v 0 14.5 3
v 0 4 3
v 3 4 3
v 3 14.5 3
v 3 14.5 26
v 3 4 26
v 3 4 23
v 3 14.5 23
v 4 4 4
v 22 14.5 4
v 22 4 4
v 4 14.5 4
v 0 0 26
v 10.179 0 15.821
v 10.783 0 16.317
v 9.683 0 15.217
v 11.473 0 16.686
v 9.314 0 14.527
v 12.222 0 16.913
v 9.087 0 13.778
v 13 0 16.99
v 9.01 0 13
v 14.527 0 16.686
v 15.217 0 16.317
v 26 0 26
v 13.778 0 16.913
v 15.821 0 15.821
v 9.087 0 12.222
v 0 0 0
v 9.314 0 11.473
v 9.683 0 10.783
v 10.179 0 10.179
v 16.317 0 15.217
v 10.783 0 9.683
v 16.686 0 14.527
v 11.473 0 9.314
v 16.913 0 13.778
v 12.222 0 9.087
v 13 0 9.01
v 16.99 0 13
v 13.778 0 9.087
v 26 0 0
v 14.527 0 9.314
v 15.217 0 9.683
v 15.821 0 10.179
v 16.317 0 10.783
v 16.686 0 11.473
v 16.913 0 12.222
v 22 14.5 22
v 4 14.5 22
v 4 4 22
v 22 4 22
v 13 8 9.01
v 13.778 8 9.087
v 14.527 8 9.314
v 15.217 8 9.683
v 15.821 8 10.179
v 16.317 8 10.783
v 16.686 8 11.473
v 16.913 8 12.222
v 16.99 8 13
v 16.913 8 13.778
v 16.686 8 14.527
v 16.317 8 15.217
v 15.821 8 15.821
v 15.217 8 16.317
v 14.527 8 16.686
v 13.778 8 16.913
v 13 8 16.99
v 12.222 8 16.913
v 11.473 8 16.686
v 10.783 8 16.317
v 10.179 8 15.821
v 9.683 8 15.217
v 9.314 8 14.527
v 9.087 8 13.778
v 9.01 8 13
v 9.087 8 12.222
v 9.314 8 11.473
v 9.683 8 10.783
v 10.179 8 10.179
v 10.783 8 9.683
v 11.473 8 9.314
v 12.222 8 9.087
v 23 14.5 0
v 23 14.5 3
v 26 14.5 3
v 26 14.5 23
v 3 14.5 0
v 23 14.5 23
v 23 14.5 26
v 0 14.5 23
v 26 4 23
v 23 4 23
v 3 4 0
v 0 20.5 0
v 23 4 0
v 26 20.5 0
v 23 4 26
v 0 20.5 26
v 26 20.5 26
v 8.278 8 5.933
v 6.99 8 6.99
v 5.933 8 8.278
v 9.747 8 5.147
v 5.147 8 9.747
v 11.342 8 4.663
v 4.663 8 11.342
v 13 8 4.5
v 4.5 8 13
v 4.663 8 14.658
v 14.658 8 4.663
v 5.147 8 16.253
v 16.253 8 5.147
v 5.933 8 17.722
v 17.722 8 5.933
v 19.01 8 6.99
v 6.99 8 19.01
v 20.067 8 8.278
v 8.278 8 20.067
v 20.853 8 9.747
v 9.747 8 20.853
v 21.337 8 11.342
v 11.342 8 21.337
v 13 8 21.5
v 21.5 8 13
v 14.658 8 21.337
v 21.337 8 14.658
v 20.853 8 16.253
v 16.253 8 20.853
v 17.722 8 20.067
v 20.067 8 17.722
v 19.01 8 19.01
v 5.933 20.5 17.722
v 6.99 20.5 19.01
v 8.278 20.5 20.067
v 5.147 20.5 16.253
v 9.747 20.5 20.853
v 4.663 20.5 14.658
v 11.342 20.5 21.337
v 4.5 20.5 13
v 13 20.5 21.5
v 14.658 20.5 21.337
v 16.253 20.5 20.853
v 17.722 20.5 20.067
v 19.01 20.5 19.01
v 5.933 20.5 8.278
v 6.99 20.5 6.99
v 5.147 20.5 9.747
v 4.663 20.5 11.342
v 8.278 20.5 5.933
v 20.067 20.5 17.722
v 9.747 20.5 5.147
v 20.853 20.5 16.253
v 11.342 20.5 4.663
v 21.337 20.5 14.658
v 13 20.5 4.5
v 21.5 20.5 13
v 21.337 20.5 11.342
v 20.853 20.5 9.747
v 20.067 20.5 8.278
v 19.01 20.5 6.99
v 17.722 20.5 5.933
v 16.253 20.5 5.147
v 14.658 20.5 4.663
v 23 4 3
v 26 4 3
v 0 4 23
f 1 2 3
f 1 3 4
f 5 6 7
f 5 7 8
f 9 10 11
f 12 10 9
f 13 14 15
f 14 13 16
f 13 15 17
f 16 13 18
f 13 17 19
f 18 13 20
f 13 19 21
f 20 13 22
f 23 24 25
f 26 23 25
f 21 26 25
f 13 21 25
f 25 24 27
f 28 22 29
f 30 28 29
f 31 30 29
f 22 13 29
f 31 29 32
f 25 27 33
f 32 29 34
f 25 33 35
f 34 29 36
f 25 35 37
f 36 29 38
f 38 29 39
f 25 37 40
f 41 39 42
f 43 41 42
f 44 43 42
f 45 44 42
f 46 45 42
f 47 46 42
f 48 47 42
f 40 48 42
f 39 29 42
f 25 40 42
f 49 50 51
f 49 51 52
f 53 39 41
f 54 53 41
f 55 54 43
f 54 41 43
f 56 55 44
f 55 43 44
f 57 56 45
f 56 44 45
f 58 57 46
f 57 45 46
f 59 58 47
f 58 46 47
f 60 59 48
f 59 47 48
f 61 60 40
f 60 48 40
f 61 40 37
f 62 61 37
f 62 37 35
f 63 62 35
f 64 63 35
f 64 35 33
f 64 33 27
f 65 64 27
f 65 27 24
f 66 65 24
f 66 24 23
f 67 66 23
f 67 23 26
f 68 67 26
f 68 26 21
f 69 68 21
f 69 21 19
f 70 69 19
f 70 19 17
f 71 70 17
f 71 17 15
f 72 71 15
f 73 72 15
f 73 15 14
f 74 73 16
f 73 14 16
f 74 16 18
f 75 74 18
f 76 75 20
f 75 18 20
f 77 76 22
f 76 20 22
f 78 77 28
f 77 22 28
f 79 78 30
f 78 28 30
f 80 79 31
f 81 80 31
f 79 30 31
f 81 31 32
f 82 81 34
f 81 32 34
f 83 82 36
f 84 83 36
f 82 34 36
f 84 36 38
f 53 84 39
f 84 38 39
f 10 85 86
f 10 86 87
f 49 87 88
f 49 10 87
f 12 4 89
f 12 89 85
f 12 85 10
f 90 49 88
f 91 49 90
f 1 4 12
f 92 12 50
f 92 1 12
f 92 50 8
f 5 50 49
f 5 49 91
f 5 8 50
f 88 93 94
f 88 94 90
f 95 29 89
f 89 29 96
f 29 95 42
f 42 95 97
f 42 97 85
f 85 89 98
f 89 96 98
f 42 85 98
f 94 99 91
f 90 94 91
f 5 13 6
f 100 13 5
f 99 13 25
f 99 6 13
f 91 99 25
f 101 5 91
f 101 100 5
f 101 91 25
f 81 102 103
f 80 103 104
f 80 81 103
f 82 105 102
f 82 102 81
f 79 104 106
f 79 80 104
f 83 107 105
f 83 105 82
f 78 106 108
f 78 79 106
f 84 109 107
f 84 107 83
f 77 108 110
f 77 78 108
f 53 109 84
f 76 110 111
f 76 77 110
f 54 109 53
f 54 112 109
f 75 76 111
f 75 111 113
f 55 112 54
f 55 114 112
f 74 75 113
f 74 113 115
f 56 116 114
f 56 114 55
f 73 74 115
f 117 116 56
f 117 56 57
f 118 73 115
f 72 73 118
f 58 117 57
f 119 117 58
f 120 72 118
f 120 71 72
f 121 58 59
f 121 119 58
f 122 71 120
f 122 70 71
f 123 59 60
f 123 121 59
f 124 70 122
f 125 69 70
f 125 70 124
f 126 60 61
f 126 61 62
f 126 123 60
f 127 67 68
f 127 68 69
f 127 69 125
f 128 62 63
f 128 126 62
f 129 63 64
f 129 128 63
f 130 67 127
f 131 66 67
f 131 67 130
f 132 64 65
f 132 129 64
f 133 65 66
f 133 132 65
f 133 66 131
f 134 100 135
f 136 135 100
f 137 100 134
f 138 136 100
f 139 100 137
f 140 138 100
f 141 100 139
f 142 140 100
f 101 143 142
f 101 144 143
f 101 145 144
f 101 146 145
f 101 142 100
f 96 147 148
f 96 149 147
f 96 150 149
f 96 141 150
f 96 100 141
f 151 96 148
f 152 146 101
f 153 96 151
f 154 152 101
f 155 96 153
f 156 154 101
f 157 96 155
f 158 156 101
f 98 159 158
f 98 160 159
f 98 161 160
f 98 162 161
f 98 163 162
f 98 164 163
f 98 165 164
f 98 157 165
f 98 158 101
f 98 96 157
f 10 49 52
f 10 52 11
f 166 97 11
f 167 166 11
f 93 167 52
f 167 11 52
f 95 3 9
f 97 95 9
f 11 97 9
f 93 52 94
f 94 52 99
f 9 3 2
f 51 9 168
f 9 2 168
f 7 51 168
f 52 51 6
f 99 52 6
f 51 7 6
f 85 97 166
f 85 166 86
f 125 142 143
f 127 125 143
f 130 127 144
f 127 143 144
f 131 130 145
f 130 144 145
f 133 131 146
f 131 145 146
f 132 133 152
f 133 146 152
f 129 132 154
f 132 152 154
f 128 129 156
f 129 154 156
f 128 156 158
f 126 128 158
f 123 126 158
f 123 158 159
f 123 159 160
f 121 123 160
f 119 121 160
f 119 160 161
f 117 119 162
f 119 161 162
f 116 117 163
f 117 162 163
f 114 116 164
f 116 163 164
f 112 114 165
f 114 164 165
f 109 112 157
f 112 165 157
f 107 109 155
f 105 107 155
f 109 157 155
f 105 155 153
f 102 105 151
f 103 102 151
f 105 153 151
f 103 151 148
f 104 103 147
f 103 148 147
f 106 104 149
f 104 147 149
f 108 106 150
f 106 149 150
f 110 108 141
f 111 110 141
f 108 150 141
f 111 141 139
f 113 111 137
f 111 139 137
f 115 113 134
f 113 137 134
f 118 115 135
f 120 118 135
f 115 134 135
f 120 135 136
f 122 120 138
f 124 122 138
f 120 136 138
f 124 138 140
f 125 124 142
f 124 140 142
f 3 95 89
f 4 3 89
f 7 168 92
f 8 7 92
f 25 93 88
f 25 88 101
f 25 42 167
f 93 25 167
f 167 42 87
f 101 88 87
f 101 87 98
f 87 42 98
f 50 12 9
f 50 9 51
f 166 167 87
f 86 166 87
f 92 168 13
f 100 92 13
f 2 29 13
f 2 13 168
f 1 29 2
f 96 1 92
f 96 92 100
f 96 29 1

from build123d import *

# Parameters (mm, degrees)
SKETCH2_W                = 26
SKETCH2_H                = 20.5
BOSS_EXTRUDE1_DEPTH      = 26
HAPTUATOR_HOLE_R         = 8.5
HAPTUATORINSERTION_DEPTH = 12.5
SKETCH8_R                = 3.989772047
CLEARANCE_DEPTH          = 43.09809972
CUTOUT_W                 = 20
CUTOUT_H                 = 10.5
CUT_EXTRUDE3_DEPTH       = 4
CIRPATTERN1_COUNT        = 4


with BuildPart() as part:
    # Sketch2 → Boss-Extrude1 (new body)
    with BuildSketch(Plane.XY):
        with Locations((13, 10.25)):
            Rectangle(SKETCH2_W, SKETCH2_H)
    extrude(amount=BOSS_EXTRUDE1_DEPTH)

    # Haptuator Hole → HaptuatorInsertion (cut)
    with BuildSketch(Plane(origin=(0, 20.5, 0), x_dir=(1, 0, 0), z_dir=(0, 1, 0))):
        with Locations((13, -13)):
            Circle(HAPTUATOR_HOLE_R)
    extrude(amount=-HAPTUATORINSERTION_DEPTH, mode=Mode.SUBTRACT)

    # Sketch8 → Clearance (cut, through all)
    with BuildSketch(Plane.XZ):
        with Locations((13, 13)):
            Circle(SKETCH8_R)
    extrude(amount=-CLEARANCE_DEPTH, mode=Mode.SUBTRACT)

    # cutout → Cut-Extrude3 (cut)
    with BuildSketch(Plane.XY.offset(26)):
        with Locations((13, 9.25)):
            Rectangle(CUTOUT_W, CUTOUT_H)
    cut_extrude3 = extrude(amount=-CUT_EXTRUDE3_DEPTH, mode=Mode.SUBTRACT)

    # CirPattern1: Cut-Extrude3 ×4 about axis
    cirpattern1_axis = Axis((13, -1.025, 13), (0, 1, 0))
    for i in range(1, CIRPATTERN1_COUNT):
        add(cut_extrude3.rotate(cirpattern1_axis, i * 360 / CIRPATTERN1_COUNT), mode=Mode.SUBTRACT)


solid = part.part
